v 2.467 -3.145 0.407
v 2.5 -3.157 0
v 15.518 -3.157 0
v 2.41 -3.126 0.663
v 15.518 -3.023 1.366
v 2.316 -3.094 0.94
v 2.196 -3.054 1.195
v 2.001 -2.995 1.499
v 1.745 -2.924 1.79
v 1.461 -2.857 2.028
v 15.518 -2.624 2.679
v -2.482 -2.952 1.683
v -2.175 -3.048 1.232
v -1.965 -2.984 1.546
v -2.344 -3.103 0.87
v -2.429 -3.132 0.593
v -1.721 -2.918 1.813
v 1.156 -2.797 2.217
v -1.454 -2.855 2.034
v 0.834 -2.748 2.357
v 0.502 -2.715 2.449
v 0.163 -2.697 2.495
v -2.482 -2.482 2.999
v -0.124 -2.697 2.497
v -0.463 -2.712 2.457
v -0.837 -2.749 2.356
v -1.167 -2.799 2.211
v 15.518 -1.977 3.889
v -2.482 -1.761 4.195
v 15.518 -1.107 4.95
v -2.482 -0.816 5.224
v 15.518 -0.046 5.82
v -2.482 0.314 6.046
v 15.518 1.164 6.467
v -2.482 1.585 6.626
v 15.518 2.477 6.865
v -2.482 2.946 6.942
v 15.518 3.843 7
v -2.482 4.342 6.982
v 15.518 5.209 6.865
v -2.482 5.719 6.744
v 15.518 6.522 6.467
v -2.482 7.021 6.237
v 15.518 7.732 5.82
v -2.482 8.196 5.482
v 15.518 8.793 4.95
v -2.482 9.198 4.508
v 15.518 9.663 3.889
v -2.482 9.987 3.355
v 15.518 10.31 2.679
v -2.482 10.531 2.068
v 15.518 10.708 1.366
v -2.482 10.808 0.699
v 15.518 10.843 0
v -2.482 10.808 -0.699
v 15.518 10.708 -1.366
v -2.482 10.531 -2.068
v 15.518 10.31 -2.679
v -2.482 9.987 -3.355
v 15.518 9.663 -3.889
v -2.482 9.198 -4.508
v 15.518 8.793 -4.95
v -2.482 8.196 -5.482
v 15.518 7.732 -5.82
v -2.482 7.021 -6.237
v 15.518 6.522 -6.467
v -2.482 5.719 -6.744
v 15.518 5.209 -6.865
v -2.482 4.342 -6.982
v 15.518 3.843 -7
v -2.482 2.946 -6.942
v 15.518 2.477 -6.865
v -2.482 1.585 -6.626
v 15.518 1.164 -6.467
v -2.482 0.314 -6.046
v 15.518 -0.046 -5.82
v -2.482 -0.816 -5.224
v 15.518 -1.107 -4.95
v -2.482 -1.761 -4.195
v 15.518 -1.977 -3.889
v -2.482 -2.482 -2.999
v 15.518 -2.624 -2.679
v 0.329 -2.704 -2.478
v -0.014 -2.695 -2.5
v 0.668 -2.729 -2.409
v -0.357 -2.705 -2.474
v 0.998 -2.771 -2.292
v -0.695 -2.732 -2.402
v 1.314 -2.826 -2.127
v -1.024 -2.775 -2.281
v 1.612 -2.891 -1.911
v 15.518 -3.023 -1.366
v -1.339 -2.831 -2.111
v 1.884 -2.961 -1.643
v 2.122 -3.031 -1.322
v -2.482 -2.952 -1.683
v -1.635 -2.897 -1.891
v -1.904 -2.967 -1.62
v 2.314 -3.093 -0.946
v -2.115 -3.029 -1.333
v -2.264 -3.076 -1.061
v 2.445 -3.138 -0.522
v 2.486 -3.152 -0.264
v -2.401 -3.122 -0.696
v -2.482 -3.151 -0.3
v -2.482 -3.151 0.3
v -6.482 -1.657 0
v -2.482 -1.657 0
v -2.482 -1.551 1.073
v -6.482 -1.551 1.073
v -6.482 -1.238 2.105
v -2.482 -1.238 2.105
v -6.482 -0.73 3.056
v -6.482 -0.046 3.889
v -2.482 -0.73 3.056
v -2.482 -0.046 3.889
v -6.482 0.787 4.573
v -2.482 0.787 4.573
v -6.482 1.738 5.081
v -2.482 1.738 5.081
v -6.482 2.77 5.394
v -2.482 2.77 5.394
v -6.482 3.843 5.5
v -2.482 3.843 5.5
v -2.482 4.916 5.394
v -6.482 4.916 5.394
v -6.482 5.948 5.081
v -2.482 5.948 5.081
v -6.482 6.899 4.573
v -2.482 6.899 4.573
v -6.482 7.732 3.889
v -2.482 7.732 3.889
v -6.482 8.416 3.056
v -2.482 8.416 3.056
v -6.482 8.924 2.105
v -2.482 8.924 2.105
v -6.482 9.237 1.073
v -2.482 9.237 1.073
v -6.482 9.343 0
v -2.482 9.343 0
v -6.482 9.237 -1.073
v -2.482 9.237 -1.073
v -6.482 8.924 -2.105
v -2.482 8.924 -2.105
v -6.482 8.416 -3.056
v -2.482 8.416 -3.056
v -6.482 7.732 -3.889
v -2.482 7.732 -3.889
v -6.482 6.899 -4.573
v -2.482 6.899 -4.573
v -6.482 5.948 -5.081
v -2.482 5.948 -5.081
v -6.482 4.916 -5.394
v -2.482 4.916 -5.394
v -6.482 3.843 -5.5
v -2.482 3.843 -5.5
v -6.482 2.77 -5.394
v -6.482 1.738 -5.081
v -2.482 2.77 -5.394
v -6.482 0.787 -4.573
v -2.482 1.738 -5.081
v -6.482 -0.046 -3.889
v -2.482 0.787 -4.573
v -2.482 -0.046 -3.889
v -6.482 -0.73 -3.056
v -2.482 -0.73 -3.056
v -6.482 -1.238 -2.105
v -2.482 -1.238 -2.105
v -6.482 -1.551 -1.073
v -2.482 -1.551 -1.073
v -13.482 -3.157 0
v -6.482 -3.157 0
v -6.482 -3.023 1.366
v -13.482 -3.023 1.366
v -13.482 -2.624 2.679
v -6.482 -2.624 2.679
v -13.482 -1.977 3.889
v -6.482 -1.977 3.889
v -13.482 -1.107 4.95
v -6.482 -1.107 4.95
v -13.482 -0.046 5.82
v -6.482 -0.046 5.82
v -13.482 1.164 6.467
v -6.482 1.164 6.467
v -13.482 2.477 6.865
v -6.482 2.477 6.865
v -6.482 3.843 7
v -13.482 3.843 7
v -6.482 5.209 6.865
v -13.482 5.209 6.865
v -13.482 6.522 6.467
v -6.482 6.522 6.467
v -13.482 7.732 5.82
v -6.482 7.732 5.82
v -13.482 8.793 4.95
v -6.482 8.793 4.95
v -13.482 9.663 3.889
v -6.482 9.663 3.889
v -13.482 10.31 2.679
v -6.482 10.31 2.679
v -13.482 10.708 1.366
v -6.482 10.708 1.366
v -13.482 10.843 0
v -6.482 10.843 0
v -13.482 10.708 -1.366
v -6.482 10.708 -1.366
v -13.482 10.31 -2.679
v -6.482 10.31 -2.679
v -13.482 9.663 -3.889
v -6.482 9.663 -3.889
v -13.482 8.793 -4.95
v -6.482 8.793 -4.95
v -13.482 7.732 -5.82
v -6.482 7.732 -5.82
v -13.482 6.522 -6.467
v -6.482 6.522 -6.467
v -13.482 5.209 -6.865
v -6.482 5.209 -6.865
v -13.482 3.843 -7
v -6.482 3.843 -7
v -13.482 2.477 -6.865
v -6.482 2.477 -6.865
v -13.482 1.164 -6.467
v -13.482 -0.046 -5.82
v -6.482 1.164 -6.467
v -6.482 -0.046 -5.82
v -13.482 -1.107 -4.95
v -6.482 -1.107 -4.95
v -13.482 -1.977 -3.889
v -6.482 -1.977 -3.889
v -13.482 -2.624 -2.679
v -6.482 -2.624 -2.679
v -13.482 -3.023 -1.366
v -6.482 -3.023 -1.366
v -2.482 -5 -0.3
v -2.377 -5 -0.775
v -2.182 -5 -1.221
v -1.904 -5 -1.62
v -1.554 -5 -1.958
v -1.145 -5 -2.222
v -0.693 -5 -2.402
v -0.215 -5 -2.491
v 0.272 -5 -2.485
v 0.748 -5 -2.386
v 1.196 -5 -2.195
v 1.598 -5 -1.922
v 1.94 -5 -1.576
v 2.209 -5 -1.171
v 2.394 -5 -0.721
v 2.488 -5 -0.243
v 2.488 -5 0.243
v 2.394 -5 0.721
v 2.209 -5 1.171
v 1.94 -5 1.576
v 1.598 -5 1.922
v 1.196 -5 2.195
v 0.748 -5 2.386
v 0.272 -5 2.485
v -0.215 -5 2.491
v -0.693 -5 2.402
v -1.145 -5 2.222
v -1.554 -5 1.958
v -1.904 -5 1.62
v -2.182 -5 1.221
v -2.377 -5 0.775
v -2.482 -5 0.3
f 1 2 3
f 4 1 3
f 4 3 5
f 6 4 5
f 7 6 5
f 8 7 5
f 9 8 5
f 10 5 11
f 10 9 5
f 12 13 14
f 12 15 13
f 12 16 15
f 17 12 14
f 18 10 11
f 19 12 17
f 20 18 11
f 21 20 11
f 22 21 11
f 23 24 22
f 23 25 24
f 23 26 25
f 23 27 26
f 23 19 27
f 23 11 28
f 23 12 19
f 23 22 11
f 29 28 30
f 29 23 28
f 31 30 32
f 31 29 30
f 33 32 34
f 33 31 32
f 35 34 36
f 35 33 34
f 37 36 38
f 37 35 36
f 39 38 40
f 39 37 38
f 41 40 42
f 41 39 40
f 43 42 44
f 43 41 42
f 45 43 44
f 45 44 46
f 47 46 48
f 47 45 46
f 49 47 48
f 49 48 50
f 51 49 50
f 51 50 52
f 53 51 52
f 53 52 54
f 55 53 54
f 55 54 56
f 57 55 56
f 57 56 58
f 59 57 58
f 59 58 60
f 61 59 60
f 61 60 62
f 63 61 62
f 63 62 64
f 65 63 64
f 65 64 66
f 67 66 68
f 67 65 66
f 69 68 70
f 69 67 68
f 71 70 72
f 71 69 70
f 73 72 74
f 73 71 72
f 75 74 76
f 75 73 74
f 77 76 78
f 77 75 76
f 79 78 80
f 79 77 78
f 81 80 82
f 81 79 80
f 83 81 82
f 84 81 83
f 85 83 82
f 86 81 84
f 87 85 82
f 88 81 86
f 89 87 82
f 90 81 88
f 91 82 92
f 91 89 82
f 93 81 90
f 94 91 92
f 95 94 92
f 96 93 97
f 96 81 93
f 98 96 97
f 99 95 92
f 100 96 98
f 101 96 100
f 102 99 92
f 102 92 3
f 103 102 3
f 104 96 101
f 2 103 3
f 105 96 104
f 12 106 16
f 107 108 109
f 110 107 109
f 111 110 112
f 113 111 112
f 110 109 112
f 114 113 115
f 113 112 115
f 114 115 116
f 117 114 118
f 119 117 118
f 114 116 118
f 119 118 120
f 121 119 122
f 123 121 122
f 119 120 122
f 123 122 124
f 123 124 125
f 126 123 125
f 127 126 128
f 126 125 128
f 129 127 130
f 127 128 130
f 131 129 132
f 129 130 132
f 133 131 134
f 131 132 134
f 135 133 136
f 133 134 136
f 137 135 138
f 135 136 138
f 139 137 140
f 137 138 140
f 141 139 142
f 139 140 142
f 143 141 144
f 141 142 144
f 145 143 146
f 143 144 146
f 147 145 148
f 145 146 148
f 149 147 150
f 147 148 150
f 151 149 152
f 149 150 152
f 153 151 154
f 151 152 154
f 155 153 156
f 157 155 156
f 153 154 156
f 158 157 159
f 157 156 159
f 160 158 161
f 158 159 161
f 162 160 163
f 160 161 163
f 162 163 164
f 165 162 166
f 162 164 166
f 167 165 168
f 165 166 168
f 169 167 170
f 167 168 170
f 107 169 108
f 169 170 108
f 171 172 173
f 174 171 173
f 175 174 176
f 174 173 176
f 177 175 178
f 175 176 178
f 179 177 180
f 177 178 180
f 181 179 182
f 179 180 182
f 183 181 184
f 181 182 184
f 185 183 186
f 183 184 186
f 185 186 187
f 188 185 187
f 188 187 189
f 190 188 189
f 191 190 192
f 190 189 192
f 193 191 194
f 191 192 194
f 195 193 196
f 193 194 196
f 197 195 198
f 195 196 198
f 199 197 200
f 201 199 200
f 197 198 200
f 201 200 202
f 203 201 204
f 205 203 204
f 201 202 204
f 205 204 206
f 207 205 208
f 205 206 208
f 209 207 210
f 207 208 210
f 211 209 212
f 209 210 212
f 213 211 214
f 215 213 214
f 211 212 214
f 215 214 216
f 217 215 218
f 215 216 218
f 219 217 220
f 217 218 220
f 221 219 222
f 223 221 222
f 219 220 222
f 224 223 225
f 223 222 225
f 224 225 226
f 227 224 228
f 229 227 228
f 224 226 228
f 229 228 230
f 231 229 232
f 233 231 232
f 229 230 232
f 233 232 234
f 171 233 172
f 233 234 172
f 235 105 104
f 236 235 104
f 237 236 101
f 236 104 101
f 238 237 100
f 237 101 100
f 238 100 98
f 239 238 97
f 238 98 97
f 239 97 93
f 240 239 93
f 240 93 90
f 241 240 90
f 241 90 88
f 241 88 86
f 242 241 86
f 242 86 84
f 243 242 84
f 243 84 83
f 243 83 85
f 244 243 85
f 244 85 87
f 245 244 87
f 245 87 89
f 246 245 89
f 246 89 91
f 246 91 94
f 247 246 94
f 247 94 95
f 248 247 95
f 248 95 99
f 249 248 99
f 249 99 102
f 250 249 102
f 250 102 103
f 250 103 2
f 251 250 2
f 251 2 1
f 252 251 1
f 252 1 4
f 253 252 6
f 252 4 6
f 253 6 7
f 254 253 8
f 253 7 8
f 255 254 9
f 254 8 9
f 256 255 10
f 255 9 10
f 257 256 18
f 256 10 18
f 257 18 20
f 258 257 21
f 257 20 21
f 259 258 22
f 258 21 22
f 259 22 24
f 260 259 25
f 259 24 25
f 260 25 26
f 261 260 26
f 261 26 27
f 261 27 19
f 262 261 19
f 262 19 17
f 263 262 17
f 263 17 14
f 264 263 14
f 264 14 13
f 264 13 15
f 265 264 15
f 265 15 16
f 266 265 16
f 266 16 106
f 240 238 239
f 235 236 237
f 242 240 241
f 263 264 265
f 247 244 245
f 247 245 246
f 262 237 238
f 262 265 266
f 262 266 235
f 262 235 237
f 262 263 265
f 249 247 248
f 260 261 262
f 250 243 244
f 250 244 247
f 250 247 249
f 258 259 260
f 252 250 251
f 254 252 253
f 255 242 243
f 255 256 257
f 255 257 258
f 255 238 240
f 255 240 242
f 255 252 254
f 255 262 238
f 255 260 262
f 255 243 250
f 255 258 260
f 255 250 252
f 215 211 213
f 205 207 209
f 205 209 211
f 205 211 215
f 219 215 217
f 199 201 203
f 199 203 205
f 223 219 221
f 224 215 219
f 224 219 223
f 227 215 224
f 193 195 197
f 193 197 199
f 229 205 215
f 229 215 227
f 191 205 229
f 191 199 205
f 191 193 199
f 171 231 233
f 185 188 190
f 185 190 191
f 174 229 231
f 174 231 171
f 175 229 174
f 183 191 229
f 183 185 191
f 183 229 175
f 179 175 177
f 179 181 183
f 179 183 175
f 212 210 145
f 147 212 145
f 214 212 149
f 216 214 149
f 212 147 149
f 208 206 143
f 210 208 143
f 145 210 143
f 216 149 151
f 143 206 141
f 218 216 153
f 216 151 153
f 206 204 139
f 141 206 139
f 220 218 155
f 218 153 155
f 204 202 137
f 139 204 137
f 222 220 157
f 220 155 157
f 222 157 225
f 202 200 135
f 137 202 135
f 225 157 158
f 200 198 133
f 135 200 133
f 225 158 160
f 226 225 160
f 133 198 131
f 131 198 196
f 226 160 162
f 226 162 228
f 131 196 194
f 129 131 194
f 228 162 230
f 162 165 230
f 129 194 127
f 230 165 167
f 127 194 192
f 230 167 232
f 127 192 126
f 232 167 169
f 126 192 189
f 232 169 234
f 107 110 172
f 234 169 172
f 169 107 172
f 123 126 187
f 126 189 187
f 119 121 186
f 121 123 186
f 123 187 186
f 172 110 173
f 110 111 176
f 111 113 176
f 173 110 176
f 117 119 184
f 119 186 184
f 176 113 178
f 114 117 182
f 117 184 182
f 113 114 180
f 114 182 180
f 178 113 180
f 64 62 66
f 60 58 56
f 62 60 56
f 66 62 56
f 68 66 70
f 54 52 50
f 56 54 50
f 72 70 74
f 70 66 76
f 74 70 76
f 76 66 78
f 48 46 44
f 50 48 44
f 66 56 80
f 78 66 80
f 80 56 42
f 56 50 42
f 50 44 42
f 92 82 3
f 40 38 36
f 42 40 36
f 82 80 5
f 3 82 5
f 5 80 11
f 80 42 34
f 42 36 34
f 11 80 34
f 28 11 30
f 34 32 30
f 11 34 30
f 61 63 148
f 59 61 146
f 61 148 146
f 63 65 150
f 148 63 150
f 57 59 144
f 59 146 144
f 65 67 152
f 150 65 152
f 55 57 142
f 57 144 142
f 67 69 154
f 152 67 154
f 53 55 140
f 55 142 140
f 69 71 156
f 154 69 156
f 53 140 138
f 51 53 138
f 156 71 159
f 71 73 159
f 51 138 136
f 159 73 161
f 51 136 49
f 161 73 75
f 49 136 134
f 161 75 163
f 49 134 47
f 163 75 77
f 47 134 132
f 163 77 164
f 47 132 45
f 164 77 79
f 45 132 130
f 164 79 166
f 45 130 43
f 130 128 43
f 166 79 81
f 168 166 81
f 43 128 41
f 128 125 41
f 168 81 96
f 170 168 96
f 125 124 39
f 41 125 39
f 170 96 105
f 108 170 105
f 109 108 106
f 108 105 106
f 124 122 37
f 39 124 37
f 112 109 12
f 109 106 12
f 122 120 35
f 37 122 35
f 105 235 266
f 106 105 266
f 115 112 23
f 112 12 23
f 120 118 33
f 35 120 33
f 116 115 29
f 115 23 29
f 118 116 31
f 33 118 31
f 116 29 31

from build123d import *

# Parameters (mm, degrees)
F0_R     = 2.5
F1_DEPTH = 5
F2_W     = 0.1429862286
F2_H     = 0.6
F3_DEPTH = 25
F4_R     = 7
F5_DEPTH = 18
F6_R     = 5.5
F7_DEPTH = 4
F8_R     = 7
F9_DEPTH = 7


with BuildPart() as f1:
    # F0 (on Front) → F1 (new body)
    with BuildSketch(Plane.XZ):
        Circle(F0_R)
    extrude(amount=F1_DEPTH)

    # F2 (on face) → F3 (cut)
    with BuildSketch(Plane.XZ.offset(5)):
        with Locations((-2.5534278435, 0)):
            Rectangle(F2_W, F2_H)
    extrude(amount=-F3_DEPTH, mode=Mode.SUBTRACT)

    # F4 (on face) → F5 (join)
    with BuildSketch(Plane(origin=(-2.4819347292, 0, 0), x_dir=(0, -1, 0), z_dir=(-1, 0, 0))):
        with Locations((-3.8429031865, 0)):
            Circle(F4_R)
    extrude(amount=-F5_DEPTH)

    # F6 (on face) → F7 (join)
    with BuildSketch(Plane(origin=(-2.4819347292, 0, 0), x_dir=(0, -1, 0), z_dir=(-1, 0, 0))):
        with Locations((-3.8429031865, 0)):
            Circle(F6_R)
    extrude(amount=F7_DEPTH)

    # F8 (on face) → F9 (join)
    with BuildSketch(Plane(origin=(-6.4819347292, 0, 0), x_dir=(0, -1, 0), z_dir=(-1, 0, 0))):
        with Locations((-3.8429031865, 0)):
            Circle(F8_R)
    extrude(amount=F9_DEPTH)


solid = f1.part
